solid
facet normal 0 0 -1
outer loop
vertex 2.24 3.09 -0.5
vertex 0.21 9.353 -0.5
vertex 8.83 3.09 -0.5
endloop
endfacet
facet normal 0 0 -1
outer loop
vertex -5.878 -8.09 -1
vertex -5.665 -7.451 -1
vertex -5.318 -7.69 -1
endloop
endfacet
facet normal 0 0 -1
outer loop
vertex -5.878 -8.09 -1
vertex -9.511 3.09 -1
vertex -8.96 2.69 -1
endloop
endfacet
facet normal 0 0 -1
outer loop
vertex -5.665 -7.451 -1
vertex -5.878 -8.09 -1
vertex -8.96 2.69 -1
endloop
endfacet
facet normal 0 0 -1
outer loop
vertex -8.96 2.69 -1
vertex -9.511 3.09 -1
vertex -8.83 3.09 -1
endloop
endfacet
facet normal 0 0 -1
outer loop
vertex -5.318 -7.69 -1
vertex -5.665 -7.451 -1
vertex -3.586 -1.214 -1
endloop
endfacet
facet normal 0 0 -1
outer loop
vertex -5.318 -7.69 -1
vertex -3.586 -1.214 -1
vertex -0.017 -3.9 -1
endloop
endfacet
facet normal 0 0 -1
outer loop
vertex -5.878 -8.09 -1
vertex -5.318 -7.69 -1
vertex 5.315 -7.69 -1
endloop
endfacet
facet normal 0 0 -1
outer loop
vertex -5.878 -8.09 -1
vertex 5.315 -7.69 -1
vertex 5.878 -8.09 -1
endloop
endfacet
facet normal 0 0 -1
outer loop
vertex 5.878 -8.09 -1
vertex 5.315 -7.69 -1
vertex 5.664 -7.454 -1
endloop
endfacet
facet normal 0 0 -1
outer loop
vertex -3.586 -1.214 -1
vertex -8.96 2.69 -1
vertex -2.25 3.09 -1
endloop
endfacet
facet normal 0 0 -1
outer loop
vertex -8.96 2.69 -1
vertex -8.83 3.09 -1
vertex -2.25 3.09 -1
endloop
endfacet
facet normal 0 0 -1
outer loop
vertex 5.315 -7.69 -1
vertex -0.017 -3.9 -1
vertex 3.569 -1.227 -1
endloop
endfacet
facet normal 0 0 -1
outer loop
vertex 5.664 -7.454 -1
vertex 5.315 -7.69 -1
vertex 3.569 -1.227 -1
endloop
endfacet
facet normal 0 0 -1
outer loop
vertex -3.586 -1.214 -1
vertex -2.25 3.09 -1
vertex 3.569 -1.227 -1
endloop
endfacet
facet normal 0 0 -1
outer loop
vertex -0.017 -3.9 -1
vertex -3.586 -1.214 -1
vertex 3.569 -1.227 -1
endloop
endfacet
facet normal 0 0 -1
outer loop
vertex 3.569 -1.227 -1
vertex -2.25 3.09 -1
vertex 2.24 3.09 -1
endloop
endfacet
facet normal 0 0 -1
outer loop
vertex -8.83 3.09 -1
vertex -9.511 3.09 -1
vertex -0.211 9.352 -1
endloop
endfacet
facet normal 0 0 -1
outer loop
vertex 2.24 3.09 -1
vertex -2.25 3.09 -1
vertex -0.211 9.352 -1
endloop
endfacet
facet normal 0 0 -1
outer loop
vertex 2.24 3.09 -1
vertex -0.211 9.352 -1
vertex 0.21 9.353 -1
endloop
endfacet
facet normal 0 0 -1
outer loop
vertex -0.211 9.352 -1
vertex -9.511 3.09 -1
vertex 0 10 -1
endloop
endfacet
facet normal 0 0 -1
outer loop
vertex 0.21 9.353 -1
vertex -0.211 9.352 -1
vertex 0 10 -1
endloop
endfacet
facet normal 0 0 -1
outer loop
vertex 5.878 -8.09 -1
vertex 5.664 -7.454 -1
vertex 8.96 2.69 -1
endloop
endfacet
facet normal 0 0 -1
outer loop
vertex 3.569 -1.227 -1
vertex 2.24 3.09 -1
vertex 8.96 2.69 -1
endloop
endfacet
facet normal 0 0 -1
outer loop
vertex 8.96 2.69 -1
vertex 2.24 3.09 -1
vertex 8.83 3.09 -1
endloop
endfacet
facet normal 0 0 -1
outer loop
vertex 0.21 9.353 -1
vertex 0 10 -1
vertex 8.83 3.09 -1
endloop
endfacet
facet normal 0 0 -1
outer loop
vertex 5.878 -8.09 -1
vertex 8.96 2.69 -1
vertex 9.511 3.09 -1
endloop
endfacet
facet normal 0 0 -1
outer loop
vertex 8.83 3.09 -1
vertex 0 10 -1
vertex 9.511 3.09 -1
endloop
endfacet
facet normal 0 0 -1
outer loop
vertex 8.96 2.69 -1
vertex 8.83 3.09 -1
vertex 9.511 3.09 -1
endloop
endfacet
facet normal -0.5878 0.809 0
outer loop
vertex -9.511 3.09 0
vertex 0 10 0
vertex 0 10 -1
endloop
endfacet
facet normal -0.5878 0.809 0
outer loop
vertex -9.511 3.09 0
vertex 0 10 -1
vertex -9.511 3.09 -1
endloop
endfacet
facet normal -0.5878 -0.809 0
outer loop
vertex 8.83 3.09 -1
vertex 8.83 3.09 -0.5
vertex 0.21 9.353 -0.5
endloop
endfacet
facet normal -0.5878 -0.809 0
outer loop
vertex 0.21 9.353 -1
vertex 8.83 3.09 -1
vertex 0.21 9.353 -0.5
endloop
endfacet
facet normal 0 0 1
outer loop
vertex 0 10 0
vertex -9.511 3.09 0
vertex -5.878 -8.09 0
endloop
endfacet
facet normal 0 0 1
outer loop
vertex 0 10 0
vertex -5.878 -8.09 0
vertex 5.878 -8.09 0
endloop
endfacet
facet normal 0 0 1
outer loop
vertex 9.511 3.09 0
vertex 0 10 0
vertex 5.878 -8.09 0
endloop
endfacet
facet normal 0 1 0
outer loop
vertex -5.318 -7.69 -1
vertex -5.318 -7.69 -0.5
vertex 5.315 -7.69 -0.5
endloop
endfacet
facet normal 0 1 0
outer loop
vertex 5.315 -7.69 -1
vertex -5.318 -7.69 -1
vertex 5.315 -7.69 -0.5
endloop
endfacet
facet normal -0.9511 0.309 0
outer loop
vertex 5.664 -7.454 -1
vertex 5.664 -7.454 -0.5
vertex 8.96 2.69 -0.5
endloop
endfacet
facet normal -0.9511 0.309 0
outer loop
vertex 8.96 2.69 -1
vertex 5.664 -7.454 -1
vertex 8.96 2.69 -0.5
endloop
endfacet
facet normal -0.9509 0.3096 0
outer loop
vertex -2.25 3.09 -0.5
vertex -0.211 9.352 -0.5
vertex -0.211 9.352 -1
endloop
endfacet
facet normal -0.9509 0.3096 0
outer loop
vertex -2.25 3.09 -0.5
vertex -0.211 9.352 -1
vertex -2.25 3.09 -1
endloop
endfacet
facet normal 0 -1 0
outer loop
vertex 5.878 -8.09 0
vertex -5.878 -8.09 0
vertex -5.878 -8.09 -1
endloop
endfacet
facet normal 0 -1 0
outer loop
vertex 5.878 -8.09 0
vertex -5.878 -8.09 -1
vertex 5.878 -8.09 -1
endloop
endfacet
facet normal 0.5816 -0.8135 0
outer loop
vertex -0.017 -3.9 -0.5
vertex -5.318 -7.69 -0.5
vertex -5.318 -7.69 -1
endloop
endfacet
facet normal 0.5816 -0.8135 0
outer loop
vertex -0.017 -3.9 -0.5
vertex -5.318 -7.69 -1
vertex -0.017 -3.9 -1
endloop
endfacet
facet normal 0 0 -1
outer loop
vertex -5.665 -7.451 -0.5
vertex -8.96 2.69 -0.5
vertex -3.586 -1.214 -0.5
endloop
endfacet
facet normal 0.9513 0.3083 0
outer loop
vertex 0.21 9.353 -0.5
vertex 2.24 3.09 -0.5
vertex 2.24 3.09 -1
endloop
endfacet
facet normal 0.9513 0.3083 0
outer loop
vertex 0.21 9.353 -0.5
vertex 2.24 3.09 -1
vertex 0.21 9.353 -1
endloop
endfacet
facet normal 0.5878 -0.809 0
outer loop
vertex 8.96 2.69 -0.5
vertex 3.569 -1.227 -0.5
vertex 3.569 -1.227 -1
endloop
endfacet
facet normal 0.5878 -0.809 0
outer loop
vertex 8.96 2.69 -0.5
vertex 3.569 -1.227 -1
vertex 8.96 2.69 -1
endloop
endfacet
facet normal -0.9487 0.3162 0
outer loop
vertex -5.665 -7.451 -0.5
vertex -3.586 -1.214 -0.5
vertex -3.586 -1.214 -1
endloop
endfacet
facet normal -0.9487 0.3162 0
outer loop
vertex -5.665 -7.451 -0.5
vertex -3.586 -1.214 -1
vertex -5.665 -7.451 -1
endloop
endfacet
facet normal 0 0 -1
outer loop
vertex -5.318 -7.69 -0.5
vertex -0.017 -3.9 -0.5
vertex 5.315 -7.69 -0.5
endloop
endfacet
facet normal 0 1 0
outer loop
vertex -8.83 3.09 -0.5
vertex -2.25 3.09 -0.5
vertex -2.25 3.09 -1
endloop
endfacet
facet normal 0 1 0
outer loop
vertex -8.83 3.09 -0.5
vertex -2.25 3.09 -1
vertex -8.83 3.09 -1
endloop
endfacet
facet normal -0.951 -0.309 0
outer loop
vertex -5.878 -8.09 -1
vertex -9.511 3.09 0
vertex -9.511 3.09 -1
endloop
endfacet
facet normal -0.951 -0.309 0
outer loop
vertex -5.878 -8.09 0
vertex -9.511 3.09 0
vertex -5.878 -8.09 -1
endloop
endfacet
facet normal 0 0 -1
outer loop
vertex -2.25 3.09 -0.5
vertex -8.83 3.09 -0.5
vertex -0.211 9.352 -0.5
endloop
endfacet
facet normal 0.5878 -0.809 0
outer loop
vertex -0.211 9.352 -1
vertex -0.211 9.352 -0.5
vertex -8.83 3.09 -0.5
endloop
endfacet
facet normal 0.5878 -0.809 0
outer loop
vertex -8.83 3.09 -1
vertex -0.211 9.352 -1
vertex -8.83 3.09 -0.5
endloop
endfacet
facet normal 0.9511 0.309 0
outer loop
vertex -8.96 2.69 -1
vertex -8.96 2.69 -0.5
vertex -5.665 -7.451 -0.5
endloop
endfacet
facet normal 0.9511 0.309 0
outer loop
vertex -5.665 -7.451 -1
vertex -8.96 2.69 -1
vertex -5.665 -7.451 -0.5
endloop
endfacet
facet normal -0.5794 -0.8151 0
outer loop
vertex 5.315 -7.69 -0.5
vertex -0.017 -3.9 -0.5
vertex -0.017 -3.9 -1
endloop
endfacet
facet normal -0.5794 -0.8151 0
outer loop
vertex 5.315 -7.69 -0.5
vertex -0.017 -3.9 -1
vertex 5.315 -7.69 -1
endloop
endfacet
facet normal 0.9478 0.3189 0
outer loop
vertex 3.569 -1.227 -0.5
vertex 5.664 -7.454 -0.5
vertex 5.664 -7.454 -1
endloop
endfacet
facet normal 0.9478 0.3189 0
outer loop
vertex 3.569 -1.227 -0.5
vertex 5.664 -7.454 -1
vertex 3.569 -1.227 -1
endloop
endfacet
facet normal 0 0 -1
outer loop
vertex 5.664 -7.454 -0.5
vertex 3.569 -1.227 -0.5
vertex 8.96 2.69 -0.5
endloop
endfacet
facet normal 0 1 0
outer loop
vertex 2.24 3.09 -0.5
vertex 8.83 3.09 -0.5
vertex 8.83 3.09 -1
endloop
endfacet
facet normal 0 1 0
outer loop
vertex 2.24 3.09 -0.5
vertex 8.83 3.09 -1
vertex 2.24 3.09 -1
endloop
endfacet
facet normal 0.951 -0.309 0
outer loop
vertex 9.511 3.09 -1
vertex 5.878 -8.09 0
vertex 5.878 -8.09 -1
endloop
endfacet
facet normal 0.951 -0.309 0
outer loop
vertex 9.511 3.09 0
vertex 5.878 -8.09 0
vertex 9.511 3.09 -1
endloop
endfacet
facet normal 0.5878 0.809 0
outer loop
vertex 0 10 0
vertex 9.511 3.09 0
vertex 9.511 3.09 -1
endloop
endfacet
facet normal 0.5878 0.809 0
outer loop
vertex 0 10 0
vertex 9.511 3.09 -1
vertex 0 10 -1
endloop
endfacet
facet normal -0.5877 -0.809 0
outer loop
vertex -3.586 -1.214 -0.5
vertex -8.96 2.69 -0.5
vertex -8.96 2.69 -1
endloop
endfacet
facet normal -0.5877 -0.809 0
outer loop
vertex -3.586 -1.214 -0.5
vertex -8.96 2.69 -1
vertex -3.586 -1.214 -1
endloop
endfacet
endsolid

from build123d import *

# Parameters (mm, degrees)
SALIENTE_EXTRUIR1_DEPTH = 1
SALIENTE_EXTRUIR2_DEPTH = 0.5


with BuildPart() as part:
    # Croquis1 → Saliente-Extruir1 (new body)
    with BuildSketch(Plane.XY):
        Polygon((5.877852523, -8.090169944), (9.510565163, 3.090169944), (0, 10), (-9.510565163, 3.090169944), (-5.877852523, -8.090169944), align=None)
        Polygon((9.040336961, 2.937383539), (0, 9.505572809), (-9.040336961, 2.937383539), (-5.587235512, -7.690169944), (5.587235512, -7.690169944), align=None, mode=Mode.SUBTRACT)
        Polygon((0.20966269, 9.353243948), (0, 9.505572809), (-0.210923368, 9.352328012), (-2.250282014, 3.090169944), (-8.830044516, 3.090169944), (-9.040336961, 2.937383539), (-8.960012395, 2.690169944), (-3.585831742, -1.214400854), (-5.664867685, -7.451242681), (-5.587235512, -7.690169944), (-5.318402678, -7.690169944), (-0.017323898, -3.899961523), (5.315095177, -7.690169944), (5.587235512, -7.690169944), (5.66389501, -7.454236269), (3.568710751, -1.226839982), (8.960012395, 2.690169944), (9.040336961, 2.937383539), (8.830044516, 3.090169944), (2.24, 3.090169944), align=None)
    extrude(amount=-SALIENTE_EXTRUIR1_DEPTH)

    # Croquis1_3 → Saliente-Extruir2 (add)
    with BuildSketch(Plane.XY):
        Polygon((8.830044516, 3.090169944), (0.20966269, 9.353243948), (2.24, 3.090169944), align=None)
        Polygon((-2.250282014, 3.090169944), (-0.210923368, 9.352328012), (-8.830044516, 3.090169944), align=None)
        Polygon((-3.585831742, -1.214400854), (-8.960012395, 2.690169944), (-5.664867685, -7.451242681), align=None)
        Polygon((-0.017323898, -3.899961523), (-5.318402678, -7.690169944), (5.315095177, -7.690169944), align=None)
        Polygon((5.66389501, -7.454236269), (8.960012395, 2.690169944), (3.568710751, -1.226839982), align=None)
    extrude(amount=-SALIENTE_EXTRUIR2_DEPTH)


solid = part.part
